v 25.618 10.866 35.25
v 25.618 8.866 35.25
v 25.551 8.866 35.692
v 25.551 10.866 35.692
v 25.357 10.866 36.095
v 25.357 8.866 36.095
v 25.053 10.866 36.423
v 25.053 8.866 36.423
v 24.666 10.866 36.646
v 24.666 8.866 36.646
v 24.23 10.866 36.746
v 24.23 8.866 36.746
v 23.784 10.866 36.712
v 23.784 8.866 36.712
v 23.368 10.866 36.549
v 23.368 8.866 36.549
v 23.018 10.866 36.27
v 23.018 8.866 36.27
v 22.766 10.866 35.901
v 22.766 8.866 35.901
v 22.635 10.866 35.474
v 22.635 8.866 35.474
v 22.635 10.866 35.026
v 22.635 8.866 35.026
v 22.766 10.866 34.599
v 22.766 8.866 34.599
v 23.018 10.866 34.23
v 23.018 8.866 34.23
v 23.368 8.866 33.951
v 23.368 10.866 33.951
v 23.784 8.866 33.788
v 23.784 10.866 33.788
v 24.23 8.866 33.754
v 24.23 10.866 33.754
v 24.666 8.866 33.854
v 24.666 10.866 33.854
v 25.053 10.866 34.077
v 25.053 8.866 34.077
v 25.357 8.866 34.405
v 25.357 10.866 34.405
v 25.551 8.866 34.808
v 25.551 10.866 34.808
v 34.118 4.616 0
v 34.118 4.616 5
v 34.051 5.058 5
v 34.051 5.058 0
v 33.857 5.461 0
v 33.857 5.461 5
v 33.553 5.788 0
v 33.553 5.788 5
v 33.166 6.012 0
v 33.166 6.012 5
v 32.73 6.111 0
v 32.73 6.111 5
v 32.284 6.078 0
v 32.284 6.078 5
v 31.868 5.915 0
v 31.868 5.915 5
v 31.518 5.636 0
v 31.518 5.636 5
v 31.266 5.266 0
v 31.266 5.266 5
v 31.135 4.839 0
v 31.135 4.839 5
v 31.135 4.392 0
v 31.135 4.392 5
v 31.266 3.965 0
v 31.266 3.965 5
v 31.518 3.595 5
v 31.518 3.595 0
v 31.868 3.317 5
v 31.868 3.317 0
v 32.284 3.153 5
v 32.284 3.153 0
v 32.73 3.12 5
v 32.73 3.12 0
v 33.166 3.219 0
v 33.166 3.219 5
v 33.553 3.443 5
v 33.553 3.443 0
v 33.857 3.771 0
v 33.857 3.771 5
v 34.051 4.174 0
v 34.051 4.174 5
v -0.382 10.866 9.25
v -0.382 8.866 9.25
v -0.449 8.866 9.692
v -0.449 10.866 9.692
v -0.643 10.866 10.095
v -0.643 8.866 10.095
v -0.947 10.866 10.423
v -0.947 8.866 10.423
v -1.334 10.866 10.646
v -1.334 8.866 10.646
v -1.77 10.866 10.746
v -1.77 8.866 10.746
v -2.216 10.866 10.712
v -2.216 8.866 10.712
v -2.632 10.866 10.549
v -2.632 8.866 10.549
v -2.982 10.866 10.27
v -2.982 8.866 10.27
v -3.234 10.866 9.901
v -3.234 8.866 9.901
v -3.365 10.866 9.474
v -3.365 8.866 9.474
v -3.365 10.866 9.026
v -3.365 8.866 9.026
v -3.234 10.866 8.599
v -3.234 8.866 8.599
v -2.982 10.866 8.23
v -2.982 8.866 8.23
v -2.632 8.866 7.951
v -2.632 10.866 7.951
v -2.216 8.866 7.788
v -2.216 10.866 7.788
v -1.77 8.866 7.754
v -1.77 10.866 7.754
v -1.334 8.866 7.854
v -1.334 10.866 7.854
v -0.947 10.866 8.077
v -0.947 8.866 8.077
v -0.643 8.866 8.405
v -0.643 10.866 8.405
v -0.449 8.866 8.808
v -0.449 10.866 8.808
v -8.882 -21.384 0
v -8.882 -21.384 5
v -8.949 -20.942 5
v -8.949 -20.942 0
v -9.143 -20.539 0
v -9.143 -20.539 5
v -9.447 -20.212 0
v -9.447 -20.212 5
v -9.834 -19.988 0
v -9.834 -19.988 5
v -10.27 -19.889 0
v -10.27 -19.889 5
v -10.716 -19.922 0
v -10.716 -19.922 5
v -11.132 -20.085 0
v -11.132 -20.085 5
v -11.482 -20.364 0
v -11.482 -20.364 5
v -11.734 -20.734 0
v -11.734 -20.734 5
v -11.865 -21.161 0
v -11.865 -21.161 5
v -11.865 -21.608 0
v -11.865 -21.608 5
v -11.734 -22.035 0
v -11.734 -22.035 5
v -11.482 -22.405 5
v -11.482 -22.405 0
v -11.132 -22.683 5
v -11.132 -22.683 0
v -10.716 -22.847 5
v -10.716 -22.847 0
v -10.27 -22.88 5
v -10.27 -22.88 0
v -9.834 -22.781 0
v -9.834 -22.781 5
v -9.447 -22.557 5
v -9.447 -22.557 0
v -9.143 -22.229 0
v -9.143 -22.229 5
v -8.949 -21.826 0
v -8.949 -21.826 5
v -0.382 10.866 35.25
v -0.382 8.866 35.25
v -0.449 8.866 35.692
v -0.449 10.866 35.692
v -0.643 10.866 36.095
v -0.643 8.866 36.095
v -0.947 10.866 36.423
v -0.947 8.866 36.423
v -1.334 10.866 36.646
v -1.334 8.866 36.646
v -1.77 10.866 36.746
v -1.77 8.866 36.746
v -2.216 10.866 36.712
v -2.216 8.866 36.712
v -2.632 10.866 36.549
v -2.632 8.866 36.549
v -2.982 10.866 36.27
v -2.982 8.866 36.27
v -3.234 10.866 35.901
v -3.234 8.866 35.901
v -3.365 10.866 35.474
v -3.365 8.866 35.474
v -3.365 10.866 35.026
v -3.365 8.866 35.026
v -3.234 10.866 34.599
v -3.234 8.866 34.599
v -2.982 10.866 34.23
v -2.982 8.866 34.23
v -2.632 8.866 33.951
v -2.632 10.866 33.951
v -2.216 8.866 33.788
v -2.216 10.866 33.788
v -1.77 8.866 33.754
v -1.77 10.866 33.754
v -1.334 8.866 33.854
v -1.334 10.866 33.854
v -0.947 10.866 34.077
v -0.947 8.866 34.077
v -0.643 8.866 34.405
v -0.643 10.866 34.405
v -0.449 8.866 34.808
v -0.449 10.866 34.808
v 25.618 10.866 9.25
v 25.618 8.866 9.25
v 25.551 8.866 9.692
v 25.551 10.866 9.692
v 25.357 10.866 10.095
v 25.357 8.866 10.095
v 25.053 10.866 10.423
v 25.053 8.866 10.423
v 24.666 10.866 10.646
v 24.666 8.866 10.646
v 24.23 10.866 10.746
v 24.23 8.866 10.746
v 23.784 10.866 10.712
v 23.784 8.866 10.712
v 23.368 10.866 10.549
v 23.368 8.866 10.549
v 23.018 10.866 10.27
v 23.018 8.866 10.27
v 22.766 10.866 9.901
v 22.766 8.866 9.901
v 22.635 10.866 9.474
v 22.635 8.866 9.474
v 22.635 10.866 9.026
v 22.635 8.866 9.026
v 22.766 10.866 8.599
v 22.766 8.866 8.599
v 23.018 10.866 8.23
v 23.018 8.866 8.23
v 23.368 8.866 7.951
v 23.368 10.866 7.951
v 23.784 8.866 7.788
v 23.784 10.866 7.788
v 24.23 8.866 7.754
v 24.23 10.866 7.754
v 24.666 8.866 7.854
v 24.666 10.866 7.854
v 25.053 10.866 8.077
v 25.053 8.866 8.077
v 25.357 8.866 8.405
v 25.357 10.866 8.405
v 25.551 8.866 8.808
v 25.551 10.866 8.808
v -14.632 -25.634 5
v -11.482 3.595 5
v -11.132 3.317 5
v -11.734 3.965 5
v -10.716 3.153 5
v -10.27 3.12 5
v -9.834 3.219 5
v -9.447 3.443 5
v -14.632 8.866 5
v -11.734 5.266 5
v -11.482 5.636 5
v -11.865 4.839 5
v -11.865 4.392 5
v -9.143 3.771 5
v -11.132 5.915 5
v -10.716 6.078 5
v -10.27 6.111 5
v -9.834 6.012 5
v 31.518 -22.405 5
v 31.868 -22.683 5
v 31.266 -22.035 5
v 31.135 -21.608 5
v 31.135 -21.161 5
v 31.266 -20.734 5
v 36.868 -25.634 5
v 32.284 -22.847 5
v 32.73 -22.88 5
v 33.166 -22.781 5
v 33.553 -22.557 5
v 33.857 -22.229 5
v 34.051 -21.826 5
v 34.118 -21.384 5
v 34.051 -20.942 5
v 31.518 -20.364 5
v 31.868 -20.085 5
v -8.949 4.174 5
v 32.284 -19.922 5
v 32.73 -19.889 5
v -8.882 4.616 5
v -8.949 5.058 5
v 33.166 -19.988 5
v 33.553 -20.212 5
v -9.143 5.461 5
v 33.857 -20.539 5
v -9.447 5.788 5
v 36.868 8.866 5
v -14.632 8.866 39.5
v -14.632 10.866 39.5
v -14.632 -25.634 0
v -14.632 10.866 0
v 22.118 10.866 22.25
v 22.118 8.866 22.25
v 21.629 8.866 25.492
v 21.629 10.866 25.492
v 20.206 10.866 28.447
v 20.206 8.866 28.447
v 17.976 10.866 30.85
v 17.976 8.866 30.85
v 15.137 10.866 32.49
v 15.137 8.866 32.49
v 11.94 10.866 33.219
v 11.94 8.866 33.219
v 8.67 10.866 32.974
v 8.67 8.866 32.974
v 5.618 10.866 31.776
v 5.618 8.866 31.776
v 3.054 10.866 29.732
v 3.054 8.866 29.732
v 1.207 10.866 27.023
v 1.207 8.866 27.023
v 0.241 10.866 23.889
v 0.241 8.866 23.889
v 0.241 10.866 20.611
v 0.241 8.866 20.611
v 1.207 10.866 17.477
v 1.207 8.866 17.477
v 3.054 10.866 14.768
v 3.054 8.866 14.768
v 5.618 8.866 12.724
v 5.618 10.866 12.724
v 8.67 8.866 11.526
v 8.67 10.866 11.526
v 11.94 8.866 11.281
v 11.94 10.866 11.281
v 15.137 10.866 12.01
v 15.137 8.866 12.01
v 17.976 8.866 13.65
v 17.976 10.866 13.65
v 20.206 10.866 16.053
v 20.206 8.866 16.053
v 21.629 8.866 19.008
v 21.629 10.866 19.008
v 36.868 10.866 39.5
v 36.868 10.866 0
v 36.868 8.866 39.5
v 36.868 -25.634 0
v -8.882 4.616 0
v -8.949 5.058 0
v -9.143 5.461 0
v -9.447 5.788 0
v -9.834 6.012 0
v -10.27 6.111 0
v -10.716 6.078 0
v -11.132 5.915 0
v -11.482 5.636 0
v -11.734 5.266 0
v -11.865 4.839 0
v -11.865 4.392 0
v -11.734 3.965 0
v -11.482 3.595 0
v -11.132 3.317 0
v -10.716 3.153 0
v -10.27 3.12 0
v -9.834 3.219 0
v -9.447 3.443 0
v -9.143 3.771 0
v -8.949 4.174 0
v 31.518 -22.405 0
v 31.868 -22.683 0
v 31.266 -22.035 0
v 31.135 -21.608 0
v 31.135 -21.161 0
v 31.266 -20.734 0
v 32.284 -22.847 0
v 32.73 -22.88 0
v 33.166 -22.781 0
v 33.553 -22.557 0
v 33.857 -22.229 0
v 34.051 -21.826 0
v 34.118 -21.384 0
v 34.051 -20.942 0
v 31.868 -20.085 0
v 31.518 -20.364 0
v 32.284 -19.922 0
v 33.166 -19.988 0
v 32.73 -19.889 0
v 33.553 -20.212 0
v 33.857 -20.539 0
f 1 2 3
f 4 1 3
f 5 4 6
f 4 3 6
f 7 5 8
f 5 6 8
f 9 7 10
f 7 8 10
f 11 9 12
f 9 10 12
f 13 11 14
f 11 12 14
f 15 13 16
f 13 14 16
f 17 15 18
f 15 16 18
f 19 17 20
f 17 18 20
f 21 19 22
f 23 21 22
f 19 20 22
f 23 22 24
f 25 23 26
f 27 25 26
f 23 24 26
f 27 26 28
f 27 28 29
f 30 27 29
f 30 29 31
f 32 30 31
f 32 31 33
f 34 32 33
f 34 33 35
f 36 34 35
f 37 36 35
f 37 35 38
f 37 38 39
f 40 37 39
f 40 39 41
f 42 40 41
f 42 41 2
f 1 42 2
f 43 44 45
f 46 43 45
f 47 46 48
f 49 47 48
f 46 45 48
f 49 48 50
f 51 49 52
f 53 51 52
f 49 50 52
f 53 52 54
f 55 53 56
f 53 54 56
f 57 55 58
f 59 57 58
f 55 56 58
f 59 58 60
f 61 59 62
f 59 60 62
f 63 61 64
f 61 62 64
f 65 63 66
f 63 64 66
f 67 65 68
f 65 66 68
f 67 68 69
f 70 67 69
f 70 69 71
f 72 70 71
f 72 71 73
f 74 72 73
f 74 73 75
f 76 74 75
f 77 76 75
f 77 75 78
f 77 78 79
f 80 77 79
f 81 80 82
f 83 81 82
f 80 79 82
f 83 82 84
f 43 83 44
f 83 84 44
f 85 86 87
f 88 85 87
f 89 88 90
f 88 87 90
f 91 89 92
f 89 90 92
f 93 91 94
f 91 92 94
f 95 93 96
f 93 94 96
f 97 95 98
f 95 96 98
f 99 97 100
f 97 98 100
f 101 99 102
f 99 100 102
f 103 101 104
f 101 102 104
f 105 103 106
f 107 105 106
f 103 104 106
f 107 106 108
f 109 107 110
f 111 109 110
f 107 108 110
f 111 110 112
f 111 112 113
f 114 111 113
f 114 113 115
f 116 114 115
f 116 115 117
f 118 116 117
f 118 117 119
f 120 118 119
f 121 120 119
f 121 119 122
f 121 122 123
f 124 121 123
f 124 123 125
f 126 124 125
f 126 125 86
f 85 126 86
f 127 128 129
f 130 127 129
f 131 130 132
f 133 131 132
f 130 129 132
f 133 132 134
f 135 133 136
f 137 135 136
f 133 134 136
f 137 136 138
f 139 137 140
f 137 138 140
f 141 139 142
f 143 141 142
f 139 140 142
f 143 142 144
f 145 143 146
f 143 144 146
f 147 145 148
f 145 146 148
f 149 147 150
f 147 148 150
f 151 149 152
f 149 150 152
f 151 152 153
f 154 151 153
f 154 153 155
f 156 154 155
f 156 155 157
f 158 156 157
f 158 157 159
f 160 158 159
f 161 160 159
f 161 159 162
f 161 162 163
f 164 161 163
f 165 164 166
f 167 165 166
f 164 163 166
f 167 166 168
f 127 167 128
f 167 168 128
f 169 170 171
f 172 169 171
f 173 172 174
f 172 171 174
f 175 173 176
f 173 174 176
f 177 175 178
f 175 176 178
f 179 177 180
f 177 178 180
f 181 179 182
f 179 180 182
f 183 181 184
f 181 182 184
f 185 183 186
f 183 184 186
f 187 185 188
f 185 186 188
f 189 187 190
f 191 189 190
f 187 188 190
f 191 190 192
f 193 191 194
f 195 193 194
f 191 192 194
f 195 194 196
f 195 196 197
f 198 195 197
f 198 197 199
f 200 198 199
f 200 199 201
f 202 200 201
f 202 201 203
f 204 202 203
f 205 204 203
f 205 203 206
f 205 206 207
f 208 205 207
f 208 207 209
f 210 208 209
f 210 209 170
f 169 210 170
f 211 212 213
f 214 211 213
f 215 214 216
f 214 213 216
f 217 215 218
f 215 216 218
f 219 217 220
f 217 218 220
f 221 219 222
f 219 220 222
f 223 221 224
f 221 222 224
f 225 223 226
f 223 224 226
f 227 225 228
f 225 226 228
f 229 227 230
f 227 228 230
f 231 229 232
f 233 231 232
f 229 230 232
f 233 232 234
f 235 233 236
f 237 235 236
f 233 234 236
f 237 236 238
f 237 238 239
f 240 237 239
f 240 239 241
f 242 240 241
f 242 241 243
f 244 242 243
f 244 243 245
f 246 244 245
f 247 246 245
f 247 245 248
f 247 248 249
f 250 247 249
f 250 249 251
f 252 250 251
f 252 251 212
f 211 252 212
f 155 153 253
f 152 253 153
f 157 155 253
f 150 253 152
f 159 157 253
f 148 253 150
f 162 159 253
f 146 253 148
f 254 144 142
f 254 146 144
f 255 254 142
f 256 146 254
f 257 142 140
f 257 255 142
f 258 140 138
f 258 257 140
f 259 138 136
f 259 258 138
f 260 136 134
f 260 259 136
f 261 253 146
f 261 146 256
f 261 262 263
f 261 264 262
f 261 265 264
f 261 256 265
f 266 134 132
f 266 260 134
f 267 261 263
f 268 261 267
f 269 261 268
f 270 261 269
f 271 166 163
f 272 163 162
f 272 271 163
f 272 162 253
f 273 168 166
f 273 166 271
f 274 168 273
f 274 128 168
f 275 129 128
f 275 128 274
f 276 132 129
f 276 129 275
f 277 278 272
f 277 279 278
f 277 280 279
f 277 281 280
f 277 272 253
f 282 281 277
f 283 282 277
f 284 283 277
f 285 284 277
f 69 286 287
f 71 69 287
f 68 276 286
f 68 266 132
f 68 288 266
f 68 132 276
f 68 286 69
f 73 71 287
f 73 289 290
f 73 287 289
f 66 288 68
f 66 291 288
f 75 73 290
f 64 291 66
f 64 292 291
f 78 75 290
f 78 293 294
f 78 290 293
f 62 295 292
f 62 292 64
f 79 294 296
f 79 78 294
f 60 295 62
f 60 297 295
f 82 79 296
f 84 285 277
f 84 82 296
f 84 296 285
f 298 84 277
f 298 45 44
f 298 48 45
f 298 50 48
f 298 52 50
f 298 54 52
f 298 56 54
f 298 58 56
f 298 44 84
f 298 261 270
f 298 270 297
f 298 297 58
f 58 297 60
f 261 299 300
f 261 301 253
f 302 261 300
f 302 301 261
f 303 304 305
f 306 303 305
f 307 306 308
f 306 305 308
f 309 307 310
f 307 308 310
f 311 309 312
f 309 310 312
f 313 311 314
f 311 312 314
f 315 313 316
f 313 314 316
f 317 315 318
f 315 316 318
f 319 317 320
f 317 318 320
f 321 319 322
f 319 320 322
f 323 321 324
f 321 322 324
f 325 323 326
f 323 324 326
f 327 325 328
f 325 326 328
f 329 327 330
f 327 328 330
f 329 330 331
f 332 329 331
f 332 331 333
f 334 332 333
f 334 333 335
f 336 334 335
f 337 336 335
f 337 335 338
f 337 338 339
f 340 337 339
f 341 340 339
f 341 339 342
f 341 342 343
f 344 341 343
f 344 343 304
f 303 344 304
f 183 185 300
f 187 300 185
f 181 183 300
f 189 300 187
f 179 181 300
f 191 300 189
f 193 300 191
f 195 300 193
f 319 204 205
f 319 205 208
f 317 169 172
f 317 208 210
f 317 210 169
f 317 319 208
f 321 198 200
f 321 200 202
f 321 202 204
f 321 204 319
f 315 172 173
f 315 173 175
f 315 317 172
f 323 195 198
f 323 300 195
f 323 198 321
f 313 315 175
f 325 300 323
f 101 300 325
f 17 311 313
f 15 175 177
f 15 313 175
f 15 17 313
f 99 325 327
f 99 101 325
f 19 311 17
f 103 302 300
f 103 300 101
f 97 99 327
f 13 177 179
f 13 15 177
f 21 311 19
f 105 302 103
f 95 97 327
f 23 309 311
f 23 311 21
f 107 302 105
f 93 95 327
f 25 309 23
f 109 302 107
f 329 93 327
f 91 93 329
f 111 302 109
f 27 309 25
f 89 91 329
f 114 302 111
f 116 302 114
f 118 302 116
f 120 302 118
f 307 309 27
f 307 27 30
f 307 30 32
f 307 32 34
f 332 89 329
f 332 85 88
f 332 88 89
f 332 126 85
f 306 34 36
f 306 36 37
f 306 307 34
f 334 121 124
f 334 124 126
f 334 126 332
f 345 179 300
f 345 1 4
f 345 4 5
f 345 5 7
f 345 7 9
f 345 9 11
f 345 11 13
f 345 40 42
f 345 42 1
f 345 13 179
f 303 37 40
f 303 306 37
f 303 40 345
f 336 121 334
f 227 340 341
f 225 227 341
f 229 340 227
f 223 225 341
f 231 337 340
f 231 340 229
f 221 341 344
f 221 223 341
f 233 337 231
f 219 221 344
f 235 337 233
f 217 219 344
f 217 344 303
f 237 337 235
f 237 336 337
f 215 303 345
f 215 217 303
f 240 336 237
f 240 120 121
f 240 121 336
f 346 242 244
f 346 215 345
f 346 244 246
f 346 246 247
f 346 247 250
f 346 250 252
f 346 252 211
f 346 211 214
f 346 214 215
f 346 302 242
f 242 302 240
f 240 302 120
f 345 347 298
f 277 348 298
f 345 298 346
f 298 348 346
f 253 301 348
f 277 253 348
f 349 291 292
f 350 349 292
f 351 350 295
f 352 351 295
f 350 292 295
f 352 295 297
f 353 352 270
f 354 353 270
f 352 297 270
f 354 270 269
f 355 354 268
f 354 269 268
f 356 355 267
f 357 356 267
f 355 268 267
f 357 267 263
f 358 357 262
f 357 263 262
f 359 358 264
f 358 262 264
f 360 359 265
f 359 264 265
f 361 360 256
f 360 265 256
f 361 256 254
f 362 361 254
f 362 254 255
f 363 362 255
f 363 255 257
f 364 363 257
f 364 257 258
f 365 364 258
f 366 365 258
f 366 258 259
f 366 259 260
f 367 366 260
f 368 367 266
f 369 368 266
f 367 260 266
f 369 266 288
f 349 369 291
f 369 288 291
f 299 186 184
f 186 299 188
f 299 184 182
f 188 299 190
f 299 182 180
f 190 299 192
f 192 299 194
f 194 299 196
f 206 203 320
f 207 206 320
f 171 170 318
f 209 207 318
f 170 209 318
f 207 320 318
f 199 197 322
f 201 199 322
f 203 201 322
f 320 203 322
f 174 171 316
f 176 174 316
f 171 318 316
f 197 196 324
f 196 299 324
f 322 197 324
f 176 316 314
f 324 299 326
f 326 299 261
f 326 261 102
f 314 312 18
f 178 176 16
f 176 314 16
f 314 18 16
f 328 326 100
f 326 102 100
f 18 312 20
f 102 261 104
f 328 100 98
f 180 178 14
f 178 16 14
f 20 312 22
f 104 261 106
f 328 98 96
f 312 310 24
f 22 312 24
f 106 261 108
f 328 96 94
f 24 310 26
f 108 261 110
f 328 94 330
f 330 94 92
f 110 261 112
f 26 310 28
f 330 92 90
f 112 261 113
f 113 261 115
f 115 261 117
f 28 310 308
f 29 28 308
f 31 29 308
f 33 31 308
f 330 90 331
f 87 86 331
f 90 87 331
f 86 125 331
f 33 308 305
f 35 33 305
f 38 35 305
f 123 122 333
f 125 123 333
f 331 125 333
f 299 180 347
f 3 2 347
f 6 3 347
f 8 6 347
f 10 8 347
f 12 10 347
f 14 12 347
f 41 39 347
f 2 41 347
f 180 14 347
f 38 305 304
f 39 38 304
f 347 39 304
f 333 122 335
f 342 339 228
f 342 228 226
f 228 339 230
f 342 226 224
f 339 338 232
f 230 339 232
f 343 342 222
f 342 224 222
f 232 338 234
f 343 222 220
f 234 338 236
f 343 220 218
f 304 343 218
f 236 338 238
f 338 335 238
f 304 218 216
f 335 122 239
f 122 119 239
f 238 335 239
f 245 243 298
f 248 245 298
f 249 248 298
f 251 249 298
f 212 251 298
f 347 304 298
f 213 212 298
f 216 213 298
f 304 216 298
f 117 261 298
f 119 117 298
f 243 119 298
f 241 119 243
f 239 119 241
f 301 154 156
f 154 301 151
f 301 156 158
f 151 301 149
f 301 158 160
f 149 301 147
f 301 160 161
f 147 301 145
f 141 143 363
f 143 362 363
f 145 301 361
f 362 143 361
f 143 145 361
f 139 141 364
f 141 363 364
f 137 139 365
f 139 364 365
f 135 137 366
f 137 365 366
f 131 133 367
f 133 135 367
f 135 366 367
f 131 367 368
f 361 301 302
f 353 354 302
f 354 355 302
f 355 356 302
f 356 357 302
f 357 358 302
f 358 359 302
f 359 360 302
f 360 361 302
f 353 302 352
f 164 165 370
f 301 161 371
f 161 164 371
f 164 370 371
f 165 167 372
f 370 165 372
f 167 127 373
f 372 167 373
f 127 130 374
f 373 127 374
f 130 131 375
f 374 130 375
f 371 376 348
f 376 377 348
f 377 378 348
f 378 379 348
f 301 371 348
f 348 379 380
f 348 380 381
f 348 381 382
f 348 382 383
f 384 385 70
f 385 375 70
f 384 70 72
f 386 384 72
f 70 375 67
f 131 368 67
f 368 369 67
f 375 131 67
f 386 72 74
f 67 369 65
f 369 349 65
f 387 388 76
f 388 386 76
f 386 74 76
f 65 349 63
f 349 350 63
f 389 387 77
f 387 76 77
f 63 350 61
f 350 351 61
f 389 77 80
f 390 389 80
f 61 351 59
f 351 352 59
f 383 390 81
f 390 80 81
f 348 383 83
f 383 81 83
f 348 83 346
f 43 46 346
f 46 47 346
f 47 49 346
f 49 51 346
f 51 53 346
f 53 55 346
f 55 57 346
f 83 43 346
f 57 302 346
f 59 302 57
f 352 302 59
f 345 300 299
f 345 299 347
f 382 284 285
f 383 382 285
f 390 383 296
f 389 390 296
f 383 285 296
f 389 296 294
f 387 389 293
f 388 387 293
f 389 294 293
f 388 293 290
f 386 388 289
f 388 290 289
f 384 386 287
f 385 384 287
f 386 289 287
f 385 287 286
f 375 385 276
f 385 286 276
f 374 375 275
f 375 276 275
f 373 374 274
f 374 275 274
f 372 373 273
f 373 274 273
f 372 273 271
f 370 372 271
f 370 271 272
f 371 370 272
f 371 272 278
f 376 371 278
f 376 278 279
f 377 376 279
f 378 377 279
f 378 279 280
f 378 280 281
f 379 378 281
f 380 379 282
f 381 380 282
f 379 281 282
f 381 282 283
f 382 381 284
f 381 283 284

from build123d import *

# Parameters (mm, degrees)
ESQUISSE1_W             = 51.5
ESQUISSE1_H             = 36.5
BOSS_EXTRU_1_DEPTH      = 5
ESQUISSE2_R             = 1.5
ENL_V_MAT_EXTRU_1_DEPTH = 5
ESQUISSE3_W             = 51.5
ESQUISSE3_H             = 2
BOSS_EXTRU_3_DEPTH      = 34.5
ESQUISSE5_R             = 1.5
ESQUISSE5_R_2           = 11
ENL_V_MAT_EXTRU_3_DEPTH = 34.5


with BuildPart() as part:
    # Esquisse1 → Boss.-Extru.1 (new body)
    with BuildSketch(Plane.XY):
        with Locations((11.117800259, -7.384341637)):
            Rectangle(ESQUISSE1_W, ESQUISSE1_H)
    extrude(amount=BOSS_EXTRU_1_DEPTH)

    # Esquisse2 → Enlèv. mat.-Extru.1 (cut)
    with BuildSketch(Plane.XY.offset(5)):
        with Locations((-10.382199741, 4.615658363)):
            Circle(ESQUISSE2_R)
        with Locations((-10.382199741, -21.384341637)):
            Circle(ESQUISSE2_R)
        with Locations((32.617800259, -21.384341637)):
            Circle(ESQUISSE2_R)
        with Locations((32.617800259, 4.615658363)):
            Circle(ESQUISSE2_R)
    extrude(amount=-ENL_V_MAT_EXTRU_1_DEPTH, mode=Mode.SUBTRACT)

    # Esquisse3 → Boss.-Extru.3 (add)
    with BuildSketch(Plane.XY.offset(5)):
        with Locations((11.117800259, 9.865658363)):
            Rectangle(ESQUISSE3_W, ESQUISSE3_H)
    extrude(amount=BOSS_EXTRU_3_DEPTH)

    # Esquisse5 → Enlèv. mat.-Extru.3 (cut)
    with BuildSketch(Plane.XZ.offset(-8.865658363)):
        with Locations((-1.882199741, 35.25)):
            Circle(ESQUISSE5_R)
        with Locations((24.117800259, 35.25)):
            Circle(ESQUISSE5_R)
        with Locations((-1.882199741, 9.25)):
            Circle(ESQUISSE5_R)
        with Locations((24.117800259, 9.25)):
            Circle(ESQUISSE5_R)
        with Locations((11.117800259, 22.25)):
            Circle(ESQUISSE5_R_2)
    extrude(amount=-ENL_V_MAT_EXTRU_3_DEPTH, mode=Mode.SUBTRACT)


solid = part.part
